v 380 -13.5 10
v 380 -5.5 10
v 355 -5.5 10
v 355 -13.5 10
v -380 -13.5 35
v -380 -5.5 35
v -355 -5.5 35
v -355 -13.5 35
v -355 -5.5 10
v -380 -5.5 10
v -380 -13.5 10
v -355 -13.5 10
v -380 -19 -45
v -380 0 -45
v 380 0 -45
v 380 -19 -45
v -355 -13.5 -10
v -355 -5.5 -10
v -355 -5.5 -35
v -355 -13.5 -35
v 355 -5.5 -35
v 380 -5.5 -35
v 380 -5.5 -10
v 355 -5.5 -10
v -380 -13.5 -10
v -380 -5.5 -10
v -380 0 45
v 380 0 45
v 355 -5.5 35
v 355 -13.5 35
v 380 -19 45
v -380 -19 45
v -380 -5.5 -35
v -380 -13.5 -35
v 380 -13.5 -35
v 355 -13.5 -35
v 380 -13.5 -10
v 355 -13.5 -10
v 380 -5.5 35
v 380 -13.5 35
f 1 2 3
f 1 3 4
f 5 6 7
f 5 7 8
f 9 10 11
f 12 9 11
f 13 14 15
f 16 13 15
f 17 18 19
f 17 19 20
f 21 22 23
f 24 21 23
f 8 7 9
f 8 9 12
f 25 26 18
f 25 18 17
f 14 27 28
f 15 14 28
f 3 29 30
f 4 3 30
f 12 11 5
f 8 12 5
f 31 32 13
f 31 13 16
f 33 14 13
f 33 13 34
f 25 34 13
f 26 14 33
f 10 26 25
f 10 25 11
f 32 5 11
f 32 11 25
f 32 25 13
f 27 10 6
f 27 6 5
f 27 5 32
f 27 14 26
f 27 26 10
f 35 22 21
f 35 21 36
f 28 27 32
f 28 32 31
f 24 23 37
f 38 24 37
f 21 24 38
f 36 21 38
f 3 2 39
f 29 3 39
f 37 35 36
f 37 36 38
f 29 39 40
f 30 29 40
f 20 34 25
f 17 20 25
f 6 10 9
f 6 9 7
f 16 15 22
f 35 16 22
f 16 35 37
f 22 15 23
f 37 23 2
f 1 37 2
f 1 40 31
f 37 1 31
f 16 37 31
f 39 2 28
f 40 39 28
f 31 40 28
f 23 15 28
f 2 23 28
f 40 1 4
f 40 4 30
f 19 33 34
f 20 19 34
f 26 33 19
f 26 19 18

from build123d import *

# Parameters (mm, degrees)
F0_W     = 760
F0_H     = 90
F1_DEPTH = 19
F2_W     = 8
F2_H     = 25
F3_DEPTH = 25


# Not quite as in the source:
# - a pattern or mirror of a feature is missing from the dataset's text; its kind, count and spacing are read off the source's solid


with BuildPart() as f1:
    # F0 (on Front) → F1 (new body)
    with BuildSketch(Plane.XZ):
        Rectangle(F0_W, F0_H)
    extrude(amount=F1_DEPTH)

    # F2 (on face) → F3 (cut)
    with BuildSketch(Plane(origin=(-380, 0, 0), x_dir=(0, -1, 0), z_dir=(-1, 0, 0))):
        with Locations((9.5, 22.5)):
            Rectangle(F2_W, F2_H)
        with Locations((9.5, -22.5)):
            Rectangle(F2_W, F2_H)
    f3 = extrude(amount=-F3_DEPTH, mode=Mode.SUBTRACT)

    # F3_copies: F3 across plane
    add(f3.mirror(Plane(origin=(0, 0, 0), x_dir=(0, 0, 1), z_dir=(1, 0, 0))), mode=Mode.SUBTRACT)


solid = f1.part
